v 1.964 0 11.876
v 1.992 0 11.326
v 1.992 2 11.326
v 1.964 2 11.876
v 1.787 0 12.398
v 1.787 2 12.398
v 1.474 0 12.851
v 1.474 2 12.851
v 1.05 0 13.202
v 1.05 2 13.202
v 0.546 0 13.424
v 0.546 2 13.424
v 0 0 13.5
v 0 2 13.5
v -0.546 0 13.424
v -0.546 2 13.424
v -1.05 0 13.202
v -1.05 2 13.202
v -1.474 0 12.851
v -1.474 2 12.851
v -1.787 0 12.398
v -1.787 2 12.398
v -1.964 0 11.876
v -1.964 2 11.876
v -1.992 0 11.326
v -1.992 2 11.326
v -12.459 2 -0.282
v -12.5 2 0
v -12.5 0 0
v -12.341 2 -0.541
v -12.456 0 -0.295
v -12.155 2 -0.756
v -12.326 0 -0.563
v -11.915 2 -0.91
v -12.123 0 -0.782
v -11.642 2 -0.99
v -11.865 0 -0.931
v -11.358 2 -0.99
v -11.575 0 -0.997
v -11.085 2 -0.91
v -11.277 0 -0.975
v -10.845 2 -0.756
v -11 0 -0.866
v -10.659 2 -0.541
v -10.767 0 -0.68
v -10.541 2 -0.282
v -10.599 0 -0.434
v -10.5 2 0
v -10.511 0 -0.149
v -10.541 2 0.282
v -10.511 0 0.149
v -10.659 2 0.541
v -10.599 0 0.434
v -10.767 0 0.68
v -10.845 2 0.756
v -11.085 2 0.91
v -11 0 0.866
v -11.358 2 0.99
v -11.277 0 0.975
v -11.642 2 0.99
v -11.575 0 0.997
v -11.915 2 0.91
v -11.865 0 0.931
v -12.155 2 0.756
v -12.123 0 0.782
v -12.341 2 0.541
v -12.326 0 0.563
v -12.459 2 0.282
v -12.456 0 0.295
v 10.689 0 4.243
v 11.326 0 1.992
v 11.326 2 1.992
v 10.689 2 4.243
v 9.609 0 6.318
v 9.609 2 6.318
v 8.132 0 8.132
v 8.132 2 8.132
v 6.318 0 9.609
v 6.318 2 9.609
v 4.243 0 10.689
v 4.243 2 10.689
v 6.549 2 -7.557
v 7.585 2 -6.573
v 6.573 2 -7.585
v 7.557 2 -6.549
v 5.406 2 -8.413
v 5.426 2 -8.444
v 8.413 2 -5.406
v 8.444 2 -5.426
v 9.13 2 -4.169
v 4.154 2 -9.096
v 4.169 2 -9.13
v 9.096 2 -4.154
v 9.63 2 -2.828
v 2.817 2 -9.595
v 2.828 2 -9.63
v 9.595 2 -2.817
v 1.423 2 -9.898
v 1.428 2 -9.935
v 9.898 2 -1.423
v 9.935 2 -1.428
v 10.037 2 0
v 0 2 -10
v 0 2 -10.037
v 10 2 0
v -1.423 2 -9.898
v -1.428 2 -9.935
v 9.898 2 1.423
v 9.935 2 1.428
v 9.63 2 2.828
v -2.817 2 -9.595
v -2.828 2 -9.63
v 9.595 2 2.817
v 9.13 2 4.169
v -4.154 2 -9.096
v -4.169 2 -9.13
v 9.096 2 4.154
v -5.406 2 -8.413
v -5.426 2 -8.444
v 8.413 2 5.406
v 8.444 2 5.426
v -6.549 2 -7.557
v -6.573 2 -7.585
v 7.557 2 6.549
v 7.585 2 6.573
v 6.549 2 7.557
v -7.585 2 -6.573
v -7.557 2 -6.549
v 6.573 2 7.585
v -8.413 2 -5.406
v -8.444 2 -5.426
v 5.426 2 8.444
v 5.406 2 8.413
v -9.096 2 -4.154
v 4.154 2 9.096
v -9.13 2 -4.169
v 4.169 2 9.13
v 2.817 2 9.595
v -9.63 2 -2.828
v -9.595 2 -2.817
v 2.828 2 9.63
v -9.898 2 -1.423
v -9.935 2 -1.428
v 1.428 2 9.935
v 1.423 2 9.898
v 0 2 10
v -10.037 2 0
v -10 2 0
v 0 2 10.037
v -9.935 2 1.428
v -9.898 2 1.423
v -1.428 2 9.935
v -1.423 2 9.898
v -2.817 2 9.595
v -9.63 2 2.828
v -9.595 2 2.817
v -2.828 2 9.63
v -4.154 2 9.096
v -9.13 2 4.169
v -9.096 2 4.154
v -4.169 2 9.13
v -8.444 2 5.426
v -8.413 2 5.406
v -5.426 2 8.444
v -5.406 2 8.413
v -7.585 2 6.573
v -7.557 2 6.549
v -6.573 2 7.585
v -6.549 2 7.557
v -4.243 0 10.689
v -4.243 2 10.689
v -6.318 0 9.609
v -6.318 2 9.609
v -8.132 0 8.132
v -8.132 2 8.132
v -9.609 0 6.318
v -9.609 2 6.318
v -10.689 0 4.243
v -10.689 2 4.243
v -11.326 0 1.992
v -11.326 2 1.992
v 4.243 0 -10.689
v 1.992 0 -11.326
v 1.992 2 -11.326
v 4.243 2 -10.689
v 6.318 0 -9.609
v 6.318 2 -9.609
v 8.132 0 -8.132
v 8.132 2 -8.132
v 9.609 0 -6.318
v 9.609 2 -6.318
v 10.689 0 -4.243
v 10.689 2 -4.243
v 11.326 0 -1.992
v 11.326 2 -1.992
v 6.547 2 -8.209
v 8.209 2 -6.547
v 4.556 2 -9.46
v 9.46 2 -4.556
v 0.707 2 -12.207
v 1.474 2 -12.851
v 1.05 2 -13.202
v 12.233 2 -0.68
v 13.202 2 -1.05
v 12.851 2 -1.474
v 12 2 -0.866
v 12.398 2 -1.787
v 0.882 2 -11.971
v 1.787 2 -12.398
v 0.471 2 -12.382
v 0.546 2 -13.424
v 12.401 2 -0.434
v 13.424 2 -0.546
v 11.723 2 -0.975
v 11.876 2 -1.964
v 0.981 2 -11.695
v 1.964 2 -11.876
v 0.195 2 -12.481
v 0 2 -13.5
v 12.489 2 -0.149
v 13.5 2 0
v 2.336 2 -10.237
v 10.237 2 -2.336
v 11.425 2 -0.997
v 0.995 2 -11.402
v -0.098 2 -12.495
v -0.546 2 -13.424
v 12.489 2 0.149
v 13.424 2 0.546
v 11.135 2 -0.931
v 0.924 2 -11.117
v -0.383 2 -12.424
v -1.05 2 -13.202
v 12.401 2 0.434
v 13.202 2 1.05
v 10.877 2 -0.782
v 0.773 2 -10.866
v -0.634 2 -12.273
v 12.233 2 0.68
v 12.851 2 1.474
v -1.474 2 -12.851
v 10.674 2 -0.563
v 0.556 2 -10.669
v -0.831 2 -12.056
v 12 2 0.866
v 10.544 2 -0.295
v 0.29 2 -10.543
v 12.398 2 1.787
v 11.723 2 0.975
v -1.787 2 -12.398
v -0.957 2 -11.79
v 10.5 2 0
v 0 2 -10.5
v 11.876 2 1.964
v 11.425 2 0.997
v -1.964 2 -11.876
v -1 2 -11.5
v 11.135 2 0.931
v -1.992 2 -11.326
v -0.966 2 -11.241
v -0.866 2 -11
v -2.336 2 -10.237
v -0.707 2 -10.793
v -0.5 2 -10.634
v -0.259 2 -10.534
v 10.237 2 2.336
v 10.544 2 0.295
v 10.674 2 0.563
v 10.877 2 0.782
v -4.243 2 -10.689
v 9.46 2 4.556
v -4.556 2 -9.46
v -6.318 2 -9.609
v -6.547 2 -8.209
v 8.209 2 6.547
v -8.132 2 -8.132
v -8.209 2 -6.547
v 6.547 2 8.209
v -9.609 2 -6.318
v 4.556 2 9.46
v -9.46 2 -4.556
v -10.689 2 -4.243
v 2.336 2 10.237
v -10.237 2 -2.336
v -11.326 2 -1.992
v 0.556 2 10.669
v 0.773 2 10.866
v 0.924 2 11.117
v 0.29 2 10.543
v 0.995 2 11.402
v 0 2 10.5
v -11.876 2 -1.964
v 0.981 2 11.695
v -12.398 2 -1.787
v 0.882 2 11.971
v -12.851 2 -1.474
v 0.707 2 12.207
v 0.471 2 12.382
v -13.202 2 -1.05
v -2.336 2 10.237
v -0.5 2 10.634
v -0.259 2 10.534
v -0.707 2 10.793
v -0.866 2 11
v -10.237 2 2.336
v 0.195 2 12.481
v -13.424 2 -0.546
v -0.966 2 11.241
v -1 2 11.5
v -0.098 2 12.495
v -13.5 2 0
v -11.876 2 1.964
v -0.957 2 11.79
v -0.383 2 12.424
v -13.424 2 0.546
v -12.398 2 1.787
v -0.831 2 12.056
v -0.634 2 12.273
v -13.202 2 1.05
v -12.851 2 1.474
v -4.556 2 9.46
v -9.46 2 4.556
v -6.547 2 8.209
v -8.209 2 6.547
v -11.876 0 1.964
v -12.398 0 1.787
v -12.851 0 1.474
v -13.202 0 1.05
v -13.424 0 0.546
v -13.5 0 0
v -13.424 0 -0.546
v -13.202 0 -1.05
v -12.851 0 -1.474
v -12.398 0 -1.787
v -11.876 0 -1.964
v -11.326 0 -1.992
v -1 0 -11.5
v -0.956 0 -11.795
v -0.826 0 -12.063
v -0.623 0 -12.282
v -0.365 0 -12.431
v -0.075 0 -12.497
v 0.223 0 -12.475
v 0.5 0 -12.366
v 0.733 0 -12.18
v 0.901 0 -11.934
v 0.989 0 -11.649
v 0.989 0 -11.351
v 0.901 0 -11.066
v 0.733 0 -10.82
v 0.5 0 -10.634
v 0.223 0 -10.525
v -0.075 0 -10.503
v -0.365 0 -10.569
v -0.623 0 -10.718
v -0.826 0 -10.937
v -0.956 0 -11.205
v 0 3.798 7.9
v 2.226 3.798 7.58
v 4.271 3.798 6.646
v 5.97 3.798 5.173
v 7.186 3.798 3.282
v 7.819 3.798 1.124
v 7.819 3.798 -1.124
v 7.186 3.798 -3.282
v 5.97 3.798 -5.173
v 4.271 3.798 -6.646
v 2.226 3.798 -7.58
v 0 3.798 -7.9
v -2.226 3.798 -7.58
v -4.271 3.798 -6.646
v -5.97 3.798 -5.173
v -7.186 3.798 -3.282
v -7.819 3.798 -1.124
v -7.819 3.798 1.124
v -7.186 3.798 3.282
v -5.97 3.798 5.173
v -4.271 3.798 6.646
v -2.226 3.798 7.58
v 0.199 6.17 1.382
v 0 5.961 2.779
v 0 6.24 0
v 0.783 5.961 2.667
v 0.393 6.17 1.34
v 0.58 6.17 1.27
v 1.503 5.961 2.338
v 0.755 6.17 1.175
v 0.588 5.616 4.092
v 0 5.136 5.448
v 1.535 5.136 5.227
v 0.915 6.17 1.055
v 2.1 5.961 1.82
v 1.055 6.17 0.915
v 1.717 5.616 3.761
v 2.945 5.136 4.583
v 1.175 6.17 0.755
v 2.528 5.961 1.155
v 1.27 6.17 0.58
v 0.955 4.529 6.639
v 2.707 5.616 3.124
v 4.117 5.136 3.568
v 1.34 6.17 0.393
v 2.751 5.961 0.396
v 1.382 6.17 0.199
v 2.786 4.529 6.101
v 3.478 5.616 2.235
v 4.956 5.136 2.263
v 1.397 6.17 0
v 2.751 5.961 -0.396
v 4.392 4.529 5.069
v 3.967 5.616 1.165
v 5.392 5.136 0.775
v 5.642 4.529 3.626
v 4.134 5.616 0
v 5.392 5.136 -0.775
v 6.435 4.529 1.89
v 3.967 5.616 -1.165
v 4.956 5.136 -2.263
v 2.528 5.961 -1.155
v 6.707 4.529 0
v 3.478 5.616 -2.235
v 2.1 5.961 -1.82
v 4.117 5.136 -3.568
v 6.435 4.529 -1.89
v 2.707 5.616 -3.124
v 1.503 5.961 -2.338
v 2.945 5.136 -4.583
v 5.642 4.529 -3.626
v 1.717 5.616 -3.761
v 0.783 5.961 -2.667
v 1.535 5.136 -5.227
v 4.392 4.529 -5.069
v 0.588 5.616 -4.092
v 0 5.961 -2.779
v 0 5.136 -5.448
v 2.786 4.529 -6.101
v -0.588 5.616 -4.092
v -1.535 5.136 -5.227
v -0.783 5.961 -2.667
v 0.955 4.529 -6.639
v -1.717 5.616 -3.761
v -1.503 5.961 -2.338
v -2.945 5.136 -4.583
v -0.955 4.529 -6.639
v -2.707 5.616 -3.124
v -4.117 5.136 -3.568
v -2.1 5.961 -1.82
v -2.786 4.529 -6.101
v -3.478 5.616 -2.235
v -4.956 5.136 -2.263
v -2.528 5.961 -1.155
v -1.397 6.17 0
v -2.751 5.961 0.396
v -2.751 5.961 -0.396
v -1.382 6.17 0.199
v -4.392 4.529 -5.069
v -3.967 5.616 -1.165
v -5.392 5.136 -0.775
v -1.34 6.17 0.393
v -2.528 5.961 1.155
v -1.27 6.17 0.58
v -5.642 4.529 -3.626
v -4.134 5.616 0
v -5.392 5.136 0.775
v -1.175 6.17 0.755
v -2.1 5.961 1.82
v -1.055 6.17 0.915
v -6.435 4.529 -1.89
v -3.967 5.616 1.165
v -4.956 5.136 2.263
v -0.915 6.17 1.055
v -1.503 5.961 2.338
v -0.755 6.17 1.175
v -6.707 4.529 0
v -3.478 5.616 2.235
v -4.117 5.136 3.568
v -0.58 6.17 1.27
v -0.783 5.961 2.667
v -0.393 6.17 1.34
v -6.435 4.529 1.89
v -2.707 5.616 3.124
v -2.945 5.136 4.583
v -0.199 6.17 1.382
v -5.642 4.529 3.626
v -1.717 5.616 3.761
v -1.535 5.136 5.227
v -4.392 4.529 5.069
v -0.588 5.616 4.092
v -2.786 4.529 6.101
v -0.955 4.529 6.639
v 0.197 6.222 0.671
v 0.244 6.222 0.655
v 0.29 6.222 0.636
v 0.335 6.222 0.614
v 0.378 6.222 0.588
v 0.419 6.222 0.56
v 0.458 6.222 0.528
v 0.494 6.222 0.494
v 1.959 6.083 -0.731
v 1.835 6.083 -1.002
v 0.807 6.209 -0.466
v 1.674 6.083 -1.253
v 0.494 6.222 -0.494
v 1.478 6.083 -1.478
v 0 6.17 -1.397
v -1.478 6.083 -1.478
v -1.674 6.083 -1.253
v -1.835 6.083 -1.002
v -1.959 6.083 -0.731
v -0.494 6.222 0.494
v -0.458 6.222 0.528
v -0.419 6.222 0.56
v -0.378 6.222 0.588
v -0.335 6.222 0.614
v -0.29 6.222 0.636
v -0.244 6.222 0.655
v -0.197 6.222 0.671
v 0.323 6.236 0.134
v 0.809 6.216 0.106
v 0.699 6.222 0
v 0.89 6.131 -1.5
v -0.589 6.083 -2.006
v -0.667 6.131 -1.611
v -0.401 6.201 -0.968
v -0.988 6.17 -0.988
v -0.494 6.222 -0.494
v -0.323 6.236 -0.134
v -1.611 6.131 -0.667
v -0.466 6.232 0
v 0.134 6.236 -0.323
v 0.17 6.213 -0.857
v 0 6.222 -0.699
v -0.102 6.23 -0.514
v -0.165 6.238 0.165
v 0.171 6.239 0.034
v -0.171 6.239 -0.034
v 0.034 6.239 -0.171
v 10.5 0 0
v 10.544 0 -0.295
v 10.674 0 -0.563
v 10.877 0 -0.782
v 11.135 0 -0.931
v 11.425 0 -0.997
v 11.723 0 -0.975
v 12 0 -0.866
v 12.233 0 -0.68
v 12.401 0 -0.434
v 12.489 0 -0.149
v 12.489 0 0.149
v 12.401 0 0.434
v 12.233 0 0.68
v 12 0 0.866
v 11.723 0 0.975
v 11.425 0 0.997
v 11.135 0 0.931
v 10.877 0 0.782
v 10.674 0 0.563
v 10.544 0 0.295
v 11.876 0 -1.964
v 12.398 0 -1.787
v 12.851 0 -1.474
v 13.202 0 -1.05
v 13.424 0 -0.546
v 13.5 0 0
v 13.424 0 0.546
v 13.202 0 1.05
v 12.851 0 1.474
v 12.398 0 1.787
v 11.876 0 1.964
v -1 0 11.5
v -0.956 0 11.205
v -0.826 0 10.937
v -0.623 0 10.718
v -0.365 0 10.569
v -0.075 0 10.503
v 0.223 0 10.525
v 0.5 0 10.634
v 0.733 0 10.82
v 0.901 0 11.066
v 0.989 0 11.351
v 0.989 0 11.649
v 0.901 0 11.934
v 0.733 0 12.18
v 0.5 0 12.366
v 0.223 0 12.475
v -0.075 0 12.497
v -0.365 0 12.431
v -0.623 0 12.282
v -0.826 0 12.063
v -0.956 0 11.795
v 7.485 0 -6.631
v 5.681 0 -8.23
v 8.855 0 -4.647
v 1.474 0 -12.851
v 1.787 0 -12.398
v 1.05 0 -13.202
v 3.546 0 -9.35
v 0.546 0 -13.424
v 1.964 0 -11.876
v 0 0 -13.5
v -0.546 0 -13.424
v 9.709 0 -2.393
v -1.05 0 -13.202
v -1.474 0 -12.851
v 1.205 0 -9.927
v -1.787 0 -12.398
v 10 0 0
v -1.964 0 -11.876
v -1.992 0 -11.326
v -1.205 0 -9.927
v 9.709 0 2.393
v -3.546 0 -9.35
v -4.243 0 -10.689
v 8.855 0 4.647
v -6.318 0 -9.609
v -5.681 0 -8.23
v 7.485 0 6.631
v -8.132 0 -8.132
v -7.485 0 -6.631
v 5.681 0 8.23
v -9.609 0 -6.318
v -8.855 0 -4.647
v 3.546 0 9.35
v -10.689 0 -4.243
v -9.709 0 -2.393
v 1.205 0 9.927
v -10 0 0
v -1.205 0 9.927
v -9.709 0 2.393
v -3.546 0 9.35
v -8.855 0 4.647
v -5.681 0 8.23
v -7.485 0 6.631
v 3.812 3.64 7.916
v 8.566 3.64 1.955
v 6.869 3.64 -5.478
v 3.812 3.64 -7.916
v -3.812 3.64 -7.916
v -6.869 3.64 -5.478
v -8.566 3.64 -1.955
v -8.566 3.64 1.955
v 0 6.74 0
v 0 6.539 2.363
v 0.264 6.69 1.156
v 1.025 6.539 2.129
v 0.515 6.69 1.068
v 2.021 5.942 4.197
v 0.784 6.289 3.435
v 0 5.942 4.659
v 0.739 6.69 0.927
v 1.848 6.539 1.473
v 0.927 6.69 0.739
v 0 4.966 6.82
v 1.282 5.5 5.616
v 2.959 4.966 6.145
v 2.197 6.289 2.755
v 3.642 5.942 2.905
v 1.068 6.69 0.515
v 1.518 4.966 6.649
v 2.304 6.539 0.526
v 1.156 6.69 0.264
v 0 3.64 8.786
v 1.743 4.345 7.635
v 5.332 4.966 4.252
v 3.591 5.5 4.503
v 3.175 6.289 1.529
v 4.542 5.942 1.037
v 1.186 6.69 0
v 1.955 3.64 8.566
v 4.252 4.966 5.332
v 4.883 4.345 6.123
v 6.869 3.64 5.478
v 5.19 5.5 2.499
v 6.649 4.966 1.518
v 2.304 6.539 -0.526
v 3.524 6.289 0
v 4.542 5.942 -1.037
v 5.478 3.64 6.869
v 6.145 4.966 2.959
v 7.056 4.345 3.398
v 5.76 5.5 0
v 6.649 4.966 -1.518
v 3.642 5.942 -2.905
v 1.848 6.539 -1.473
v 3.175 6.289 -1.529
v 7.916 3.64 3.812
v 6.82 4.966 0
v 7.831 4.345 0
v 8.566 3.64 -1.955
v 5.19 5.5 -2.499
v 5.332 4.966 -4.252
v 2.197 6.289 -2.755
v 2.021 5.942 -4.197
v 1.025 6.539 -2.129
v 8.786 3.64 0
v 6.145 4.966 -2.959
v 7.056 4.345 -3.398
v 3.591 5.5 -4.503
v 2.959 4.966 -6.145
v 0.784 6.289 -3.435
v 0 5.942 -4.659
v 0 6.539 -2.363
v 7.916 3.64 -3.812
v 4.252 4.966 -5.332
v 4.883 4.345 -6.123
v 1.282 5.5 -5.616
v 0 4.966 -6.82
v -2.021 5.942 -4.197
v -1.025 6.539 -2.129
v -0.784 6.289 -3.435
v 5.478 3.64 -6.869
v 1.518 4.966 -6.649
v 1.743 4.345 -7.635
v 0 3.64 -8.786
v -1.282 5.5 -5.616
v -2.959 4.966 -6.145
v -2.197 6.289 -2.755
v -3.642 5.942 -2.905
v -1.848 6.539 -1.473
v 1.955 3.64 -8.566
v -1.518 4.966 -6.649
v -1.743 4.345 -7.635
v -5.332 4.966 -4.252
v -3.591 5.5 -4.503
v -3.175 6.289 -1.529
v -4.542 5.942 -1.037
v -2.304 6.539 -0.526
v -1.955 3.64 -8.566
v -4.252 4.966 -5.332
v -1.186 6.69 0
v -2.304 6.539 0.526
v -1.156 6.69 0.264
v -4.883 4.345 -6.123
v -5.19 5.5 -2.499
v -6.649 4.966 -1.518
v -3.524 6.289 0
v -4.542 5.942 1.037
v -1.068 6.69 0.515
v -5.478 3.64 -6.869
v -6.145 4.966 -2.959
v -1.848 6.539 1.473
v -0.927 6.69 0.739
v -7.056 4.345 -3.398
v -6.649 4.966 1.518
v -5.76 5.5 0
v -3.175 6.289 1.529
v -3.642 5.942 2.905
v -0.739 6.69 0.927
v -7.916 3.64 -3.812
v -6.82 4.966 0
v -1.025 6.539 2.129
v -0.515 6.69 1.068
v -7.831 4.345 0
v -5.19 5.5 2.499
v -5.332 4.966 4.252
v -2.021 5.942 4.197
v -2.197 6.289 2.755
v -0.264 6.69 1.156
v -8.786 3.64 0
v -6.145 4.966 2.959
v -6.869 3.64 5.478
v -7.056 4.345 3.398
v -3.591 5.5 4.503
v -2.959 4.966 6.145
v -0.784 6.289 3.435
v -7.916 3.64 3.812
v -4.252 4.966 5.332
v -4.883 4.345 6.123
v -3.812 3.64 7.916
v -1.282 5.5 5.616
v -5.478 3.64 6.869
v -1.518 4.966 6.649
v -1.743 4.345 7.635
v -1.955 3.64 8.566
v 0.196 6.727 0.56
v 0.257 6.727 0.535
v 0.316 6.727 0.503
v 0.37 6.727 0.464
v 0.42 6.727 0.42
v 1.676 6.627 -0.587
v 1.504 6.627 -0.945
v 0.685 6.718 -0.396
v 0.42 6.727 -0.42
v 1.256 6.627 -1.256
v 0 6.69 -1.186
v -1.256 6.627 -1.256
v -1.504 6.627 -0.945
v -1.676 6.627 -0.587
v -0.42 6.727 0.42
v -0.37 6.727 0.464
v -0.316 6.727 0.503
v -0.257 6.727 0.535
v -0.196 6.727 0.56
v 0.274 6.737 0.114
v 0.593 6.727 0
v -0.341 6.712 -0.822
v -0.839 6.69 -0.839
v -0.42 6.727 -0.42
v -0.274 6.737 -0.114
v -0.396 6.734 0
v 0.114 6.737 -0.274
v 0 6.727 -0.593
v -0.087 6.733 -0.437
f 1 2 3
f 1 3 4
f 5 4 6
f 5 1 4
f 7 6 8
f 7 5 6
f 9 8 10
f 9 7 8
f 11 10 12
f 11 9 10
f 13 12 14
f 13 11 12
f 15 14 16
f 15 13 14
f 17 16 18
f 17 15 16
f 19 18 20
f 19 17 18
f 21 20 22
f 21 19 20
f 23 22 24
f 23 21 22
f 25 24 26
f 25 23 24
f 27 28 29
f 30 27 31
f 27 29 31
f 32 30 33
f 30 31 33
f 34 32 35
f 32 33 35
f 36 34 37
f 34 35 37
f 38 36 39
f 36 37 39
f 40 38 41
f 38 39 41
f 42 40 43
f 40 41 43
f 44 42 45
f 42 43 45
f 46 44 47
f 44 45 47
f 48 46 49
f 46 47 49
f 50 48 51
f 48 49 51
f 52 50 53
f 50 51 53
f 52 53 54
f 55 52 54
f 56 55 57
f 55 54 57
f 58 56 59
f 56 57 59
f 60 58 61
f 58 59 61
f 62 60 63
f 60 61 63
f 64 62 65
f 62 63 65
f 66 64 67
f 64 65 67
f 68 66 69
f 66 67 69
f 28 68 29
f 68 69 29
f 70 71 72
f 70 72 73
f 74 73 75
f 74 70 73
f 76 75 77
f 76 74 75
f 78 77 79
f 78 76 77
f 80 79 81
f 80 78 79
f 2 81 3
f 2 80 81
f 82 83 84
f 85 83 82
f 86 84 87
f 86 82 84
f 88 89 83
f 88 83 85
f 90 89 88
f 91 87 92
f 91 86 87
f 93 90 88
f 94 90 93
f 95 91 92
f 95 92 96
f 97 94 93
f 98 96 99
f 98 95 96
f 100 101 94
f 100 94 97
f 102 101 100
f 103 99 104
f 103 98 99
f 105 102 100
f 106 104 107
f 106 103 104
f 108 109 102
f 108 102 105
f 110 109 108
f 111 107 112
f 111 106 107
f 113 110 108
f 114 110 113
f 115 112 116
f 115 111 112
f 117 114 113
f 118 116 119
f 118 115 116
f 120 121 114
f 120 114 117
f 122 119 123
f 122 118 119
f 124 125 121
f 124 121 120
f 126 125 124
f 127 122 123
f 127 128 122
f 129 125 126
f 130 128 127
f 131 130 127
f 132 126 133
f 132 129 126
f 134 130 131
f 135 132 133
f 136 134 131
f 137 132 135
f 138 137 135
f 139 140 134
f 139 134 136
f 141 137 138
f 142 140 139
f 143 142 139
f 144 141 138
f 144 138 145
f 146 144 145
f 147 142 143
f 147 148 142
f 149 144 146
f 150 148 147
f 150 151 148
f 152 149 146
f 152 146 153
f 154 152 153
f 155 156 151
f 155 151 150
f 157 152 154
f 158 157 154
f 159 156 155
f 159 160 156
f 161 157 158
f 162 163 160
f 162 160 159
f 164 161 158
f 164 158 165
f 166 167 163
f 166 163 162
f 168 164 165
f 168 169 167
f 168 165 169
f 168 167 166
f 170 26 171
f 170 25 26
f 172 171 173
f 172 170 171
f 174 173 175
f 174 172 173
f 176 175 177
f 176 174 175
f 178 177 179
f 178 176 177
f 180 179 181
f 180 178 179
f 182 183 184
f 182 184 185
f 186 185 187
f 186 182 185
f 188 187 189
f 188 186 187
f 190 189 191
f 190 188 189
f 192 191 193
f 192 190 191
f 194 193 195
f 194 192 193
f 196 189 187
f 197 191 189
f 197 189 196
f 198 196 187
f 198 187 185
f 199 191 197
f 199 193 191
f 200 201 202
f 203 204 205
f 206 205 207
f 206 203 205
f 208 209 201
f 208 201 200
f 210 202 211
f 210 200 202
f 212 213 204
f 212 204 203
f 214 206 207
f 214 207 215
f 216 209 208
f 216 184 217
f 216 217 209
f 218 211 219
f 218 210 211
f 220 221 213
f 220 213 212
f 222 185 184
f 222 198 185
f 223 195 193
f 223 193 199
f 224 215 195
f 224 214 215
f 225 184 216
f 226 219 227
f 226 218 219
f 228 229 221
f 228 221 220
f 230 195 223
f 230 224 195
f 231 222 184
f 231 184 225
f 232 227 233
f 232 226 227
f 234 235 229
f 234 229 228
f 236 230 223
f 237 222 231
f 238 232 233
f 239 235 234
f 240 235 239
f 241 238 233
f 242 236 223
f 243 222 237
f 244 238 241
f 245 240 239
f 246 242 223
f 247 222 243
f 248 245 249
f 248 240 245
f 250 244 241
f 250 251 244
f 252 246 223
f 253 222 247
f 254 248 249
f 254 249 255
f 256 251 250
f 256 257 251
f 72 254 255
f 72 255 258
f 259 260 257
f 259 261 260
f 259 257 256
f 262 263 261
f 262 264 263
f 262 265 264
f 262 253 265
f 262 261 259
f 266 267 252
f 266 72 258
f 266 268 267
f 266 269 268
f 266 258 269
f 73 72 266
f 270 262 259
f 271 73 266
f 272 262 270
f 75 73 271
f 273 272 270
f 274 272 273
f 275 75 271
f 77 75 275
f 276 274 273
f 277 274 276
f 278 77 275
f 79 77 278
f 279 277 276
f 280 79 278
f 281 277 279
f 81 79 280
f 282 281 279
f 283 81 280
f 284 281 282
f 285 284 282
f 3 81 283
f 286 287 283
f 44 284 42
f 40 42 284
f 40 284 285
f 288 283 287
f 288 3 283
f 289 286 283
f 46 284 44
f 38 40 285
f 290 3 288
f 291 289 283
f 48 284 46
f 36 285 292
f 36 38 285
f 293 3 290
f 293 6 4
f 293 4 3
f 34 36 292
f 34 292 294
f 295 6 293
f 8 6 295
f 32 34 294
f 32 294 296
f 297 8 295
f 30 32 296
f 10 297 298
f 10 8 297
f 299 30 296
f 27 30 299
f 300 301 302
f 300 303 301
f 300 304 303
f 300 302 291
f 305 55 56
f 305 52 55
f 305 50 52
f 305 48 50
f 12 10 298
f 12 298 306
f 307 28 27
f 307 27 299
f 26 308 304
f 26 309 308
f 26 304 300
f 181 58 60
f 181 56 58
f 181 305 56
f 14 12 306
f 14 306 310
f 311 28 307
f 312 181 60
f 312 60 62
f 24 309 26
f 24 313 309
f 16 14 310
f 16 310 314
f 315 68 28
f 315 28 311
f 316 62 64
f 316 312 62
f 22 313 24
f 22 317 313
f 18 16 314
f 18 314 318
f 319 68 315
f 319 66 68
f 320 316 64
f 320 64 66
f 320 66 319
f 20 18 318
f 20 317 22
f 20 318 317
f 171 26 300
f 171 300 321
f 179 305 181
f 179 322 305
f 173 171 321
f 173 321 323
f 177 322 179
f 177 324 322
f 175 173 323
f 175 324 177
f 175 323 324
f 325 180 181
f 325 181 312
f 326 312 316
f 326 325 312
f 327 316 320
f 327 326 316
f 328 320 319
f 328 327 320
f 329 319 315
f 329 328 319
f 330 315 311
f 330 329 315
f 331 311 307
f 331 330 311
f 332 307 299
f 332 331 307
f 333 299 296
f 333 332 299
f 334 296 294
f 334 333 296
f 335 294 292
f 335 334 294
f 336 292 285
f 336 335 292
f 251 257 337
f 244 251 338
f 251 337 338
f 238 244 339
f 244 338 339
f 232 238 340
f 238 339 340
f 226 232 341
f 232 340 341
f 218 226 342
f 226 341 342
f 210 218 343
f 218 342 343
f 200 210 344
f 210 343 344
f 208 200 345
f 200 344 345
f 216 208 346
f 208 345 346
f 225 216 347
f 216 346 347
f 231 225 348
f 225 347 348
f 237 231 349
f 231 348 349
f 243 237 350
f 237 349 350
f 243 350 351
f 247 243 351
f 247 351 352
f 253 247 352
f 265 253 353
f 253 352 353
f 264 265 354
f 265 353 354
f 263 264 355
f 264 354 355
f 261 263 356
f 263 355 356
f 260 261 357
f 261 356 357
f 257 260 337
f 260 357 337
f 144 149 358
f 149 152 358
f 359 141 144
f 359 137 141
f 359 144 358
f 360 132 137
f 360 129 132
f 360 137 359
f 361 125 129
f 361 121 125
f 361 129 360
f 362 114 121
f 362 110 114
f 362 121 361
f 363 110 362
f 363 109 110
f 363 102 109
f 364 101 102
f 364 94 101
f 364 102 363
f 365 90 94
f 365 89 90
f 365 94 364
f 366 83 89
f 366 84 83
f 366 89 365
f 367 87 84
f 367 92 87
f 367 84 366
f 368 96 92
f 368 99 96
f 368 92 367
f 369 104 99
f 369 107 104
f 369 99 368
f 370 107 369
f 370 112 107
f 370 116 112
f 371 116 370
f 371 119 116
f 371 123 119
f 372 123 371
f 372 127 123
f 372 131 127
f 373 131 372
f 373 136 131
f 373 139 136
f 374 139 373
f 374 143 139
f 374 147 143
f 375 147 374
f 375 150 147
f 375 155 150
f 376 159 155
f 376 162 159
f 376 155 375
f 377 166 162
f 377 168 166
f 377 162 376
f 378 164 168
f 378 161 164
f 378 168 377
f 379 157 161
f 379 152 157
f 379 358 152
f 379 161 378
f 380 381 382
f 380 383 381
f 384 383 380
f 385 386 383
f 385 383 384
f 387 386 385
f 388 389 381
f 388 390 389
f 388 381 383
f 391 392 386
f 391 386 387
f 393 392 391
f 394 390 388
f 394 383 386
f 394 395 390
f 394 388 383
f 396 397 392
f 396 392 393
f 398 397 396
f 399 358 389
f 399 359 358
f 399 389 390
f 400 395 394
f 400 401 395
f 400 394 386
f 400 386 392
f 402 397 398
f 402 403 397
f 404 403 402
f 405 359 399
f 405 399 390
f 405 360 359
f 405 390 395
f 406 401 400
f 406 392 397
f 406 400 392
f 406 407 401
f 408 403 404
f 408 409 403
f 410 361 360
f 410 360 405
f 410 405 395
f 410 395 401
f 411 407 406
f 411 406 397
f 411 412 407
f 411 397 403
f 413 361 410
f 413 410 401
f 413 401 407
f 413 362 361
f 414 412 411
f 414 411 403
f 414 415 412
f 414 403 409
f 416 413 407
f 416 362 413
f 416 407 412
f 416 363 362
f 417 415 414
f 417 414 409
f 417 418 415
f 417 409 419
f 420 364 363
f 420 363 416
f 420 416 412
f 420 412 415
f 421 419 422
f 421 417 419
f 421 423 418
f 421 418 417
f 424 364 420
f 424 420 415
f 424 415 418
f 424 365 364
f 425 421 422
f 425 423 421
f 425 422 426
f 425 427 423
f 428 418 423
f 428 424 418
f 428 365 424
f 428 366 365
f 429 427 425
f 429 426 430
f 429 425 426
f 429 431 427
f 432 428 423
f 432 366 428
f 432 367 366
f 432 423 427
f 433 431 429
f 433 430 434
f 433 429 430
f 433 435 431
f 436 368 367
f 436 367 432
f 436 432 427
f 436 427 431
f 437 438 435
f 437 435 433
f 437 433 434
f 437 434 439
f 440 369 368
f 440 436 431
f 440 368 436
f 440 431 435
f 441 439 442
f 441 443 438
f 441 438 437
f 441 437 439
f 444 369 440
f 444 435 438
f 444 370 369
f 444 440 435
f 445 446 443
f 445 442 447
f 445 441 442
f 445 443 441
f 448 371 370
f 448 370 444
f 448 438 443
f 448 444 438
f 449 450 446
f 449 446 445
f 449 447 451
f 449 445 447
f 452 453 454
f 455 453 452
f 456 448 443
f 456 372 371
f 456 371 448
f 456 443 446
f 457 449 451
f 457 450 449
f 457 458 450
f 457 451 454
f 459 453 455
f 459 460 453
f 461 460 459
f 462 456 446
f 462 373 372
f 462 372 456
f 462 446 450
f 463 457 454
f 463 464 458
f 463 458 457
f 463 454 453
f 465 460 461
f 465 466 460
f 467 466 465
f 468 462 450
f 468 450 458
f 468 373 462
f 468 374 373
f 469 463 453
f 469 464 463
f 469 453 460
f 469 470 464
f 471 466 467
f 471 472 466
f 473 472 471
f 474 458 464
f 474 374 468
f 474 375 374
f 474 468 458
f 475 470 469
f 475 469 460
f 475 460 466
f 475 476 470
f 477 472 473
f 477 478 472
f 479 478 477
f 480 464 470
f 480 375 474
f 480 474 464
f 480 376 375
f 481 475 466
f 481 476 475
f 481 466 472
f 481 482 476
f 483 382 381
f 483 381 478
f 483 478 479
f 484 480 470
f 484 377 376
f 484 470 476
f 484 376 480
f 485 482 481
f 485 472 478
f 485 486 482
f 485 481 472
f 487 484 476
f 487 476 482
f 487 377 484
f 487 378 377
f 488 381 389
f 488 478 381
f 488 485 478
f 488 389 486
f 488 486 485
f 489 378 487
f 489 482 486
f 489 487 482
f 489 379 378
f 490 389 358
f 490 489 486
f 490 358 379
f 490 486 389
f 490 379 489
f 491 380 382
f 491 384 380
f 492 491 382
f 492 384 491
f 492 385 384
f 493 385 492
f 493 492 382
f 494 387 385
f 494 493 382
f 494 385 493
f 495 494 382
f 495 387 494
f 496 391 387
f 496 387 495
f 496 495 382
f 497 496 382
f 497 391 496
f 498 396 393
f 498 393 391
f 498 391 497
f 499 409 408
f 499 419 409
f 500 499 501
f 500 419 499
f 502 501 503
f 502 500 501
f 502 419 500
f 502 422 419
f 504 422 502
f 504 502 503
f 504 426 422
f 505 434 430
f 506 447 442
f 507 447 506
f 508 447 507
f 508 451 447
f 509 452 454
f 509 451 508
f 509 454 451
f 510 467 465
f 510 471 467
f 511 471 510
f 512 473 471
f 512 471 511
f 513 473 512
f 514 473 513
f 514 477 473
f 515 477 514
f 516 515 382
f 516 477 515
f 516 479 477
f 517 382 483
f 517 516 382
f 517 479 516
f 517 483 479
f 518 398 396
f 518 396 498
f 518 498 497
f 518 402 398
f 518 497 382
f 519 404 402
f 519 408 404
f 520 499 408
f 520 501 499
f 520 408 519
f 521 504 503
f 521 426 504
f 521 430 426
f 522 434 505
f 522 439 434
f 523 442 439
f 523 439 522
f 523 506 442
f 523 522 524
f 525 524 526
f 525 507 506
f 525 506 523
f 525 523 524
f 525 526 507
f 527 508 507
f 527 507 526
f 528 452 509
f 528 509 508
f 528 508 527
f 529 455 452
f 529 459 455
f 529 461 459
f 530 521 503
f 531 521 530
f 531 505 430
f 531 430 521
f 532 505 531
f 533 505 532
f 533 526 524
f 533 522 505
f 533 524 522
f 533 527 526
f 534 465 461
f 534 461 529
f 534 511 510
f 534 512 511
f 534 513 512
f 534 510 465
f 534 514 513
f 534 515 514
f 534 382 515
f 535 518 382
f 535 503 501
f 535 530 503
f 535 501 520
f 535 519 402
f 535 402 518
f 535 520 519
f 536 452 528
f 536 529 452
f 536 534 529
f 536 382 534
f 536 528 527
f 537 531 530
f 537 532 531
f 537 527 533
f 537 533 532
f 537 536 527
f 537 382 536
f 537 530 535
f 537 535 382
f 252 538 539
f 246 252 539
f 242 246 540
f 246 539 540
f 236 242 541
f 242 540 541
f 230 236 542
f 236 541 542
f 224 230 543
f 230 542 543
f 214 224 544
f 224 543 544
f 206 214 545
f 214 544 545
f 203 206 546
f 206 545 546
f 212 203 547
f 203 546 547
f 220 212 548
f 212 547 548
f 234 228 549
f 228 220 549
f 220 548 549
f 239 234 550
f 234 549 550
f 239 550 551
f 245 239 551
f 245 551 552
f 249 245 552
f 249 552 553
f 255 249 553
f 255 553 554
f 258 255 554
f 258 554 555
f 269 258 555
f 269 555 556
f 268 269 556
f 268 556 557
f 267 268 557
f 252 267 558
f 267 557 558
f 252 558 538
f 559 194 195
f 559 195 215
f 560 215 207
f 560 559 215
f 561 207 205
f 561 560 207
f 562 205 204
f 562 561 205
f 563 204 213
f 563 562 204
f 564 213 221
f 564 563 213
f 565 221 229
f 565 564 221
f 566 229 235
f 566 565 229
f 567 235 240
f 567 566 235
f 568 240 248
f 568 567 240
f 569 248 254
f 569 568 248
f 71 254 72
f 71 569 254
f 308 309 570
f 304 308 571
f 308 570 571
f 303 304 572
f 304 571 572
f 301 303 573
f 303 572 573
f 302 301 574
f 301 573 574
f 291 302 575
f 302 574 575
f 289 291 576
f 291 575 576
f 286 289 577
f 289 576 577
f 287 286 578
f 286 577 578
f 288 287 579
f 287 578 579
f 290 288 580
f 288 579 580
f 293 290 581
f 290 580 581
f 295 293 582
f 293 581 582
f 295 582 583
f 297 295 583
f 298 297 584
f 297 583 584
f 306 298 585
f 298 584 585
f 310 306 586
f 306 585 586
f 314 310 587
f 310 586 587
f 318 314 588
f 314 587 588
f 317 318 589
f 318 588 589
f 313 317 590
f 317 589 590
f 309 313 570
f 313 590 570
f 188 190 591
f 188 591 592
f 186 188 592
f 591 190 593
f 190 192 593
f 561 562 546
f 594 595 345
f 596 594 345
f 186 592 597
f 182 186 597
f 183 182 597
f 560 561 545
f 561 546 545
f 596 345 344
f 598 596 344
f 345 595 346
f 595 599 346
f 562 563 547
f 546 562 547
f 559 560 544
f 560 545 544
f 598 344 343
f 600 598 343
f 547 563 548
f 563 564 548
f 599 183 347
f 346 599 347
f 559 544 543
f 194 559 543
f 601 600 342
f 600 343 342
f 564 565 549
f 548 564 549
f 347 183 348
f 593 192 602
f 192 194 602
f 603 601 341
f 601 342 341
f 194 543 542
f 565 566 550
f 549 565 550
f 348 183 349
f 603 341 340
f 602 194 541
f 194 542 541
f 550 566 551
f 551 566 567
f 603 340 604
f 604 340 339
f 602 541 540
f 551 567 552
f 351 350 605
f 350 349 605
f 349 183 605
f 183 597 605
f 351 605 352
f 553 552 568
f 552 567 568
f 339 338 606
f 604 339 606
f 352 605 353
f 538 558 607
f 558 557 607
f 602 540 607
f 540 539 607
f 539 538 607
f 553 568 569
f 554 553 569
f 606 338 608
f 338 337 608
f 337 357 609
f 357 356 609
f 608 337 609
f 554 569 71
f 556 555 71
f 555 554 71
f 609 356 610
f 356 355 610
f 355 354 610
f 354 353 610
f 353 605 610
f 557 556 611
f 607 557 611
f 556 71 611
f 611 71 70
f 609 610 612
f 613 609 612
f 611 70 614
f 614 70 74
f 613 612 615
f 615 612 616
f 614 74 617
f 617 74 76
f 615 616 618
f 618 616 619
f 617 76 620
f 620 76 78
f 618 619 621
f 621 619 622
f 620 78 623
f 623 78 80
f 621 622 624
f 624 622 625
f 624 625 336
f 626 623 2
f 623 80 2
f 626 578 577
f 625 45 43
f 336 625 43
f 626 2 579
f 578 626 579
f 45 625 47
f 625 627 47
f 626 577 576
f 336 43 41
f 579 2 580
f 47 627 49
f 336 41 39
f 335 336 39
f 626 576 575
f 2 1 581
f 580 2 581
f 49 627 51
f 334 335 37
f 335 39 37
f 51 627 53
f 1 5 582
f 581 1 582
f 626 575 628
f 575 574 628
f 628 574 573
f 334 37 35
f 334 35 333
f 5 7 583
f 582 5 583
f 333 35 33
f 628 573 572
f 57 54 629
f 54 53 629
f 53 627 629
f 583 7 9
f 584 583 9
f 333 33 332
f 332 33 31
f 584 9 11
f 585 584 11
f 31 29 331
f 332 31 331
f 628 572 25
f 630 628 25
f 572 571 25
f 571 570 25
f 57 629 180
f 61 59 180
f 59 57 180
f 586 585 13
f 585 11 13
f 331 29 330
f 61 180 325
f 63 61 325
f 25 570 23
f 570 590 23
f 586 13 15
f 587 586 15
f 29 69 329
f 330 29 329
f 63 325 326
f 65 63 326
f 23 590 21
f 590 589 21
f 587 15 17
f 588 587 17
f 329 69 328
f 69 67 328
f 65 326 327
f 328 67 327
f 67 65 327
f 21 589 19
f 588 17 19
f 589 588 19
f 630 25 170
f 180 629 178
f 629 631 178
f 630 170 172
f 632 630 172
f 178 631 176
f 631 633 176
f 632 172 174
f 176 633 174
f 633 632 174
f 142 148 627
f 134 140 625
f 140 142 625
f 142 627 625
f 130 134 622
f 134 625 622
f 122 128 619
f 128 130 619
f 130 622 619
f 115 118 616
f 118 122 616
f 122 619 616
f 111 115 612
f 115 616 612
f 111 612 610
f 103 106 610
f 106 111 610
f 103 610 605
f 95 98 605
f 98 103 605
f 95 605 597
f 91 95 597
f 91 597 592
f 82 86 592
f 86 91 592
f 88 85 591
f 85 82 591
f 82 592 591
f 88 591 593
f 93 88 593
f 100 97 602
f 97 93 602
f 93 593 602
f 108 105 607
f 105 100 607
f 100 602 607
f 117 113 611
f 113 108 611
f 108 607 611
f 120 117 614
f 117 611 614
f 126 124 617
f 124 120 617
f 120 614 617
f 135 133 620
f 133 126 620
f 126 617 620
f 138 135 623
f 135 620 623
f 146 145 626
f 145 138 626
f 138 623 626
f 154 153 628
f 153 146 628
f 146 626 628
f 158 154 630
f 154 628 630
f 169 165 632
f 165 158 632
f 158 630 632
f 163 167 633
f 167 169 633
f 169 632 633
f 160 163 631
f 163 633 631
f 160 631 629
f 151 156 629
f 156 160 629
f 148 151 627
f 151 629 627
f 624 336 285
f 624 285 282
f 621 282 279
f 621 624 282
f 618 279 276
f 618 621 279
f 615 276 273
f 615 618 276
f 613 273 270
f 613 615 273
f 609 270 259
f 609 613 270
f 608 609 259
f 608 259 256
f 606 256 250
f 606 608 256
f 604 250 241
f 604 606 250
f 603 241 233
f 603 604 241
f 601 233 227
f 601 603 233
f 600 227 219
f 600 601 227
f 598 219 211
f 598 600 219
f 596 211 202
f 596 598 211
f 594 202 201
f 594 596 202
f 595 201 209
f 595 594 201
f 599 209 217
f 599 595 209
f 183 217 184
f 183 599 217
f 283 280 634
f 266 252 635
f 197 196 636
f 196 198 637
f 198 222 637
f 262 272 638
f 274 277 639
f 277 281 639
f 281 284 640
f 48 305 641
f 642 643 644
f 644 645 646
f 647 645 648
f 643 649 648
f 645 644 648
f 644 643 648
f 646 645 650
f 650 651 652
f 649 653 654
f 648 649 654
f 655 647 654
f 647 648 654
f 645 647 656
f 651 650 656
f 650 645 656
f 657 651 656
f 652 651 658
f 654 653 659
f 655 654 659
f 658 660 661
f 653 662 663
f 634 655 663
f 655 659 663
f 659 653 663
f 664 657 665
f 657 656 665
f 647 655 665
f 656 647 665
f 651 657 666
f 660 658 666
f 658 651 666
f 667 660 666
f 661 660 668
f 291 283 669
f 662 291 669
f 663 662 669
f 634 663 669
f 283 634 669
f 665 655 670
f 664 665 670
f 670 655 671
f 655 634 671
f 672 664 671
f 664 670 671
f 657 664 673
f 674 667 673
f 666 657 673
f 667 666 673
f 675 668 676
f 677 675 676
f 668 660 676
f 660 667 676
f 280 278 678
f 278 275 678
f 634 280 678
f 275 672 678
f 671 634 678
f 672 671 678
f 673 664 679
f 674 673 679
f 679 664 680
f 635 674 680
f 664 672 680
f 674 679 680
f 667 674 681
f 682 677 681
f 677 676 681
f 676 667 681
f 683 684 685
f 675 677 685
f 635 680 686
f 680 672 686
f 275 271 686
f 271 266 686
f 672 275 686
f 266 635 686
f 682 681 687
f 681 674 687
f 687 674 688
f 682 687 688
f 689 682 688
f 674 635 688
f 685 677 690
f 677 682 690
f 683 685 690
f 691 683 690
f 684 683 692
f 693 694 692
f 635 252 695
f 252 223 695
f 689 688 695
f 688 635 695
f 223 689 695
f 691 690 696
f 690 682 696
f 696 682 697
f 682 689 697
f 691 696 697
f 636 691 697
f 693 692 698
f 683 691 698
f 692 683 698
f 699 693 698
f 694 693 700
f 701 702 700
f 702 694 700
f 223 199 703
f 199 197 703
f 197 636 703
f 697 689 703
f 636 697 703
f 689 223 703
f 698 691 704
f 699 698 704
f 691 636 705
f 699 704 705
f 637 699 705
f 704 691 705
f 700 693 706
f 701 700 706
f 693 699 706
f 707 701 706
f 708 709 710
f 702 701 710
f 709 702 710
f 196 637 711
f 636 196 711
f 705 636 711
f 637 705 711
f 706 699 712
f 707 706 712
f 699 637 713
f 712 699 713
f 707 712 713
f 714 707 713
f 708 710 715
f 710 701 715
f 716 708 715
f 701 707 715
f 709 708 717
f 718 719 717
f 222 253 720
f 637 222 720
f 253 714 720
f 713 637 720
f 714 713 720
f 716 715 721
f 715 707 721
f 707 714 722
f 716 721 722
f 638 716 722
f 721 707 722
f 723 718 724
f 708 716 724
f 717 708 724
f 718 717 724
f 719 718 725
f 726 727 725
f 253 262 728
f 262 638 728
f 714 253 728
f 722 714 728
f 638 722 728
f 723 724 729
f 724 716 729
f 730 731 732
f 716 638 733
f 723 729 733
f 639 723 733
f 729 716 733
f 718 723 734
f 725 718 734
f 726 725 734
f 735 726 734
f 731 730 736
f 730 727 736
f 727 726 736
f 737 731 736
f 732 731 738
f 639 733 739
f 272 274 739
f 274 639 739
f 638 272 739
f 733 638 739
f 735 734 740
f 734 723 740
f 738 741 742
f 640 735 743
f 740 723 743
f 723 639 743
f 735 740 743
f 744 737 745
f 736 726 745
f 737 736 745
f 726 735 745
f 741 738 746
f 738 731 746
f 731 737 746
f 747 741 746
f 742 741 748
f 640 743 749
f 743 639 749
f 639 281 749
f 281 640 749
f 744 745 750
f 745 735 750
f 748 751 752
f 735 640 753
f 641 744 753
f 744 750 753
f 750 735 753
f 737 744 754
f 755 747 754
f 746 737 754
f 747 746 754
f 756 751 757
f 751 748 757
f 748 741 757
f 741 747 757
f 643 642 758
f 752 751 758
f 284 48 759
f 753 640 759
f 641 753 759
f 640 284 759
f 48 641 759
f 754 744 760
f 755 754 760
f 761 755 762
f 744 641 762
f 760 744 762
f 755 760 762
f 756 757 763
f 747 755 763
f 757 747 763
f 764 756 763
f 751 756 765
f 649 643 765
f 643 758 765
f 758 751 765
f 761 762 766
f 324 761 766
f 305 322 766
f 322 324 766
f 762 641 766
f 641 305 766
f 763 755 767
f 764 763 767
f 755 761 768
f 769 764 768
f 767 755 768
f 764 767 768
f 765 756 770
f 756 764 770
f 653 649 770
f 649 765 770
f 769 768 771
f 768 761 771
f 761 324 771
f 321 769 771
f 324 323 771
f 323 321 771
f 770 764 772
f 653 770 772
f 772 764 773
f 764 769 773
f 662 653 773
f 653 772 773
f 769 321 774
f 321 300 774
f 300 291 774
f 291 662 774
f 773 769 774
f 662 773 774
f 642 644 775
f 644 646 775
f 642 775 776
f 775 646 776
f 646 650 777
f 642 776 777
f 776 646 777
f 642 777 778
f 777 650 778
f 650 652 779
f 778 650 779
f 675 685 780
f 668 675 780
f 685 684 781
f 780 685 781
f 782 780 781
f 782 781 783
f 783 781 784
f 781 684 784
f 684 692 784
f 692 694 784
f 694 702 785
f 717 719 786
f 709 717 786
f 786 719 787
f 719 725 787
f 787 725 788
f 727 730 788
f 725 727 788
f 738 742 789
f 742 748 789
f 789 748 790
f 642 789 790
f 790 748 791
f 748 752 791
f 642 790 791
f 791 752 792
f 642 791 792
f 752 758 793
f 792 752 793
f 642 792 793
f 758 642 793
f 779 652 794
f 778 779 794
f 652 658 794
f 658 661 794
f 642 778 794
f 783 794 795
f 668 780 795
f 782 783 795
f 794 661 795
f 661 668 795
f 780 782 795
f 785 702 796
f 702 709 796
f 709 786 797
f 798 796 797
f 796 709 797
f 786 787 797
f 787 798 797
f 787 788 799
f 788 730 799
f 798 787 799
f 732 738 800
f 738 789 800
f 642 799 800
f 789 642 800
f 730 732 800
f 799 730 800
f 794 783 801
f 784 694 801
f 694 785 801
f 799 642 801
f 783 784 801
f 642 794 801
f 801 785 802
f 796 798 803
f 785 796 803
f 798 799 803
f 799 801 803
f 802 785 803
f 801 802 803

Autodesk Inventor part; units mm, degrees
ref_plane "YZ Plane" through (0, 0, 0) normal (1, 0, 0) x (0, 1, 0)
ref_plane "XZ Plane" through (0, 0, 0) normal (0, 1, 0) x (-1, 0, 0)
ref_plane "XY Plane" through (0, 0, 0) normal (0, 0, 1) x (1, 0, 0)
sketch "Sketch1" plane through (0, 0, 0) normal (0, 1, 0) x (-1, 0, 0)
  circle A0 centre (0, 0) radius 12.5 construction
  line L0 (12.5, 0) -> (-12.5, 0) construction
  line L1 (0, -12.5) -> (0, 12.5) construction
  circle A1 centre (-11.5, 0) radius 1
  circle A2 centre (0, -11.5) radius 1
  circle A3 centre (11.5, 0) radius 1
  circle A4 centre (0, 11.5) radius 1
  circle A5 centre (0, 0) radius 10
  arc A6 (-1.9924, -11.3261) -> (1.9924, -11.3261) centre (0, -11.5) ccw
  arc A7 (-11.3261, 1.9924) -> (-11.3261, -1.9924) centre (-11.5, 0) ccw
  arc A8 (1.9924, 11.3261) -> (-1.9924, 11.3261) centre (0, 11.5) ccw
  arc A9 (11.3261, -1.9924) -> (11.3261, 1.9924) centre (11.5, 0) ccw
  arc A10 (0.9991, -11.4565) -> (11.3261, -1.9924) centre (0, 0) ccw construction
  arc A11 (1.9924, -11.3261) -> (11.3261, -1.9924) centre (0, 0) ccw
  arc A12 (11.3261, 1.9924) -> (1.9924, 11.3261) centre (0, 0) ccw construction
  arc A13 (11.3261, 1.9924) -> (1.9924, 11.3261) centre (0, 0) ccw
  arc A14 (-1.9924, 11.3261) -> (-11.3261, 1.9924) centre (0, 0) ccw construction
  arc A15 (-1.9924, 11.3261) -> (-11.3261, 1.9924) centre (0, 0) ccw
  arc A16 (-11.3261, -1.9924) -> (-1.9924, -11.3261) centre (0, 0) ccw construction
  arc A17 (-11.3261, -1.9924) -> (-1.9924, -11.3261) centre (0, 0) ccw
  line L2 (0, -10) -> (-9.6532, -10) construction
  point P0 (0, 0)
  point P1 (0, 0)
  dimension "d1" = 2
  dimension "d2" = 20
  dimension "d0" = 25
  dimension "d3" = 2
  dimension "d4" = 11.5
  dimension "d5" = 11.5
  dimension "d6" = 11.5
  dimension "d7" = 11.5
extrude "Extrusion1" add sketch "Sketch1" along normal blind 2
sketch "Sketch2" plane through (0, 0, 0) normal (1, 0, 0) x (0, 1, 0)
  line L0 (0, 0) -> (6.7399, 0) construction
  line L1 (2, 10.5) -> (0, 10.5) projected
  arc A0 (6.7399, 0) -> (2, 10.5) centre (-7.2601, 0) ccw
  line L2 (2, 10) -> (0, 10) projected
  arc A1 (6.2399, 0) -> (2, 10.0369) centre (-7.7601, 0) ccw
  line L3 (6.7399, 0) -> (6.7399, 0.4008)
  line L4 (2, 12.5) -> (2, 10.5) projected
  line L5 (2, 10) -> (2, 10.5)
  line L6 (0, 0) -> (-7.5749, 0) construction
  line L7 (6.7399, 0) -> (6.2399, 0)
  dimension "d10" = 14
  dimension "d11" = 0.5
  dimension "d12" = 14
revolve "Revolution1" add sketch "Sketch2" angle 360 about axis through (0, 0, 0) along (0, 1, 0)
properties part number "_3DPrint"
